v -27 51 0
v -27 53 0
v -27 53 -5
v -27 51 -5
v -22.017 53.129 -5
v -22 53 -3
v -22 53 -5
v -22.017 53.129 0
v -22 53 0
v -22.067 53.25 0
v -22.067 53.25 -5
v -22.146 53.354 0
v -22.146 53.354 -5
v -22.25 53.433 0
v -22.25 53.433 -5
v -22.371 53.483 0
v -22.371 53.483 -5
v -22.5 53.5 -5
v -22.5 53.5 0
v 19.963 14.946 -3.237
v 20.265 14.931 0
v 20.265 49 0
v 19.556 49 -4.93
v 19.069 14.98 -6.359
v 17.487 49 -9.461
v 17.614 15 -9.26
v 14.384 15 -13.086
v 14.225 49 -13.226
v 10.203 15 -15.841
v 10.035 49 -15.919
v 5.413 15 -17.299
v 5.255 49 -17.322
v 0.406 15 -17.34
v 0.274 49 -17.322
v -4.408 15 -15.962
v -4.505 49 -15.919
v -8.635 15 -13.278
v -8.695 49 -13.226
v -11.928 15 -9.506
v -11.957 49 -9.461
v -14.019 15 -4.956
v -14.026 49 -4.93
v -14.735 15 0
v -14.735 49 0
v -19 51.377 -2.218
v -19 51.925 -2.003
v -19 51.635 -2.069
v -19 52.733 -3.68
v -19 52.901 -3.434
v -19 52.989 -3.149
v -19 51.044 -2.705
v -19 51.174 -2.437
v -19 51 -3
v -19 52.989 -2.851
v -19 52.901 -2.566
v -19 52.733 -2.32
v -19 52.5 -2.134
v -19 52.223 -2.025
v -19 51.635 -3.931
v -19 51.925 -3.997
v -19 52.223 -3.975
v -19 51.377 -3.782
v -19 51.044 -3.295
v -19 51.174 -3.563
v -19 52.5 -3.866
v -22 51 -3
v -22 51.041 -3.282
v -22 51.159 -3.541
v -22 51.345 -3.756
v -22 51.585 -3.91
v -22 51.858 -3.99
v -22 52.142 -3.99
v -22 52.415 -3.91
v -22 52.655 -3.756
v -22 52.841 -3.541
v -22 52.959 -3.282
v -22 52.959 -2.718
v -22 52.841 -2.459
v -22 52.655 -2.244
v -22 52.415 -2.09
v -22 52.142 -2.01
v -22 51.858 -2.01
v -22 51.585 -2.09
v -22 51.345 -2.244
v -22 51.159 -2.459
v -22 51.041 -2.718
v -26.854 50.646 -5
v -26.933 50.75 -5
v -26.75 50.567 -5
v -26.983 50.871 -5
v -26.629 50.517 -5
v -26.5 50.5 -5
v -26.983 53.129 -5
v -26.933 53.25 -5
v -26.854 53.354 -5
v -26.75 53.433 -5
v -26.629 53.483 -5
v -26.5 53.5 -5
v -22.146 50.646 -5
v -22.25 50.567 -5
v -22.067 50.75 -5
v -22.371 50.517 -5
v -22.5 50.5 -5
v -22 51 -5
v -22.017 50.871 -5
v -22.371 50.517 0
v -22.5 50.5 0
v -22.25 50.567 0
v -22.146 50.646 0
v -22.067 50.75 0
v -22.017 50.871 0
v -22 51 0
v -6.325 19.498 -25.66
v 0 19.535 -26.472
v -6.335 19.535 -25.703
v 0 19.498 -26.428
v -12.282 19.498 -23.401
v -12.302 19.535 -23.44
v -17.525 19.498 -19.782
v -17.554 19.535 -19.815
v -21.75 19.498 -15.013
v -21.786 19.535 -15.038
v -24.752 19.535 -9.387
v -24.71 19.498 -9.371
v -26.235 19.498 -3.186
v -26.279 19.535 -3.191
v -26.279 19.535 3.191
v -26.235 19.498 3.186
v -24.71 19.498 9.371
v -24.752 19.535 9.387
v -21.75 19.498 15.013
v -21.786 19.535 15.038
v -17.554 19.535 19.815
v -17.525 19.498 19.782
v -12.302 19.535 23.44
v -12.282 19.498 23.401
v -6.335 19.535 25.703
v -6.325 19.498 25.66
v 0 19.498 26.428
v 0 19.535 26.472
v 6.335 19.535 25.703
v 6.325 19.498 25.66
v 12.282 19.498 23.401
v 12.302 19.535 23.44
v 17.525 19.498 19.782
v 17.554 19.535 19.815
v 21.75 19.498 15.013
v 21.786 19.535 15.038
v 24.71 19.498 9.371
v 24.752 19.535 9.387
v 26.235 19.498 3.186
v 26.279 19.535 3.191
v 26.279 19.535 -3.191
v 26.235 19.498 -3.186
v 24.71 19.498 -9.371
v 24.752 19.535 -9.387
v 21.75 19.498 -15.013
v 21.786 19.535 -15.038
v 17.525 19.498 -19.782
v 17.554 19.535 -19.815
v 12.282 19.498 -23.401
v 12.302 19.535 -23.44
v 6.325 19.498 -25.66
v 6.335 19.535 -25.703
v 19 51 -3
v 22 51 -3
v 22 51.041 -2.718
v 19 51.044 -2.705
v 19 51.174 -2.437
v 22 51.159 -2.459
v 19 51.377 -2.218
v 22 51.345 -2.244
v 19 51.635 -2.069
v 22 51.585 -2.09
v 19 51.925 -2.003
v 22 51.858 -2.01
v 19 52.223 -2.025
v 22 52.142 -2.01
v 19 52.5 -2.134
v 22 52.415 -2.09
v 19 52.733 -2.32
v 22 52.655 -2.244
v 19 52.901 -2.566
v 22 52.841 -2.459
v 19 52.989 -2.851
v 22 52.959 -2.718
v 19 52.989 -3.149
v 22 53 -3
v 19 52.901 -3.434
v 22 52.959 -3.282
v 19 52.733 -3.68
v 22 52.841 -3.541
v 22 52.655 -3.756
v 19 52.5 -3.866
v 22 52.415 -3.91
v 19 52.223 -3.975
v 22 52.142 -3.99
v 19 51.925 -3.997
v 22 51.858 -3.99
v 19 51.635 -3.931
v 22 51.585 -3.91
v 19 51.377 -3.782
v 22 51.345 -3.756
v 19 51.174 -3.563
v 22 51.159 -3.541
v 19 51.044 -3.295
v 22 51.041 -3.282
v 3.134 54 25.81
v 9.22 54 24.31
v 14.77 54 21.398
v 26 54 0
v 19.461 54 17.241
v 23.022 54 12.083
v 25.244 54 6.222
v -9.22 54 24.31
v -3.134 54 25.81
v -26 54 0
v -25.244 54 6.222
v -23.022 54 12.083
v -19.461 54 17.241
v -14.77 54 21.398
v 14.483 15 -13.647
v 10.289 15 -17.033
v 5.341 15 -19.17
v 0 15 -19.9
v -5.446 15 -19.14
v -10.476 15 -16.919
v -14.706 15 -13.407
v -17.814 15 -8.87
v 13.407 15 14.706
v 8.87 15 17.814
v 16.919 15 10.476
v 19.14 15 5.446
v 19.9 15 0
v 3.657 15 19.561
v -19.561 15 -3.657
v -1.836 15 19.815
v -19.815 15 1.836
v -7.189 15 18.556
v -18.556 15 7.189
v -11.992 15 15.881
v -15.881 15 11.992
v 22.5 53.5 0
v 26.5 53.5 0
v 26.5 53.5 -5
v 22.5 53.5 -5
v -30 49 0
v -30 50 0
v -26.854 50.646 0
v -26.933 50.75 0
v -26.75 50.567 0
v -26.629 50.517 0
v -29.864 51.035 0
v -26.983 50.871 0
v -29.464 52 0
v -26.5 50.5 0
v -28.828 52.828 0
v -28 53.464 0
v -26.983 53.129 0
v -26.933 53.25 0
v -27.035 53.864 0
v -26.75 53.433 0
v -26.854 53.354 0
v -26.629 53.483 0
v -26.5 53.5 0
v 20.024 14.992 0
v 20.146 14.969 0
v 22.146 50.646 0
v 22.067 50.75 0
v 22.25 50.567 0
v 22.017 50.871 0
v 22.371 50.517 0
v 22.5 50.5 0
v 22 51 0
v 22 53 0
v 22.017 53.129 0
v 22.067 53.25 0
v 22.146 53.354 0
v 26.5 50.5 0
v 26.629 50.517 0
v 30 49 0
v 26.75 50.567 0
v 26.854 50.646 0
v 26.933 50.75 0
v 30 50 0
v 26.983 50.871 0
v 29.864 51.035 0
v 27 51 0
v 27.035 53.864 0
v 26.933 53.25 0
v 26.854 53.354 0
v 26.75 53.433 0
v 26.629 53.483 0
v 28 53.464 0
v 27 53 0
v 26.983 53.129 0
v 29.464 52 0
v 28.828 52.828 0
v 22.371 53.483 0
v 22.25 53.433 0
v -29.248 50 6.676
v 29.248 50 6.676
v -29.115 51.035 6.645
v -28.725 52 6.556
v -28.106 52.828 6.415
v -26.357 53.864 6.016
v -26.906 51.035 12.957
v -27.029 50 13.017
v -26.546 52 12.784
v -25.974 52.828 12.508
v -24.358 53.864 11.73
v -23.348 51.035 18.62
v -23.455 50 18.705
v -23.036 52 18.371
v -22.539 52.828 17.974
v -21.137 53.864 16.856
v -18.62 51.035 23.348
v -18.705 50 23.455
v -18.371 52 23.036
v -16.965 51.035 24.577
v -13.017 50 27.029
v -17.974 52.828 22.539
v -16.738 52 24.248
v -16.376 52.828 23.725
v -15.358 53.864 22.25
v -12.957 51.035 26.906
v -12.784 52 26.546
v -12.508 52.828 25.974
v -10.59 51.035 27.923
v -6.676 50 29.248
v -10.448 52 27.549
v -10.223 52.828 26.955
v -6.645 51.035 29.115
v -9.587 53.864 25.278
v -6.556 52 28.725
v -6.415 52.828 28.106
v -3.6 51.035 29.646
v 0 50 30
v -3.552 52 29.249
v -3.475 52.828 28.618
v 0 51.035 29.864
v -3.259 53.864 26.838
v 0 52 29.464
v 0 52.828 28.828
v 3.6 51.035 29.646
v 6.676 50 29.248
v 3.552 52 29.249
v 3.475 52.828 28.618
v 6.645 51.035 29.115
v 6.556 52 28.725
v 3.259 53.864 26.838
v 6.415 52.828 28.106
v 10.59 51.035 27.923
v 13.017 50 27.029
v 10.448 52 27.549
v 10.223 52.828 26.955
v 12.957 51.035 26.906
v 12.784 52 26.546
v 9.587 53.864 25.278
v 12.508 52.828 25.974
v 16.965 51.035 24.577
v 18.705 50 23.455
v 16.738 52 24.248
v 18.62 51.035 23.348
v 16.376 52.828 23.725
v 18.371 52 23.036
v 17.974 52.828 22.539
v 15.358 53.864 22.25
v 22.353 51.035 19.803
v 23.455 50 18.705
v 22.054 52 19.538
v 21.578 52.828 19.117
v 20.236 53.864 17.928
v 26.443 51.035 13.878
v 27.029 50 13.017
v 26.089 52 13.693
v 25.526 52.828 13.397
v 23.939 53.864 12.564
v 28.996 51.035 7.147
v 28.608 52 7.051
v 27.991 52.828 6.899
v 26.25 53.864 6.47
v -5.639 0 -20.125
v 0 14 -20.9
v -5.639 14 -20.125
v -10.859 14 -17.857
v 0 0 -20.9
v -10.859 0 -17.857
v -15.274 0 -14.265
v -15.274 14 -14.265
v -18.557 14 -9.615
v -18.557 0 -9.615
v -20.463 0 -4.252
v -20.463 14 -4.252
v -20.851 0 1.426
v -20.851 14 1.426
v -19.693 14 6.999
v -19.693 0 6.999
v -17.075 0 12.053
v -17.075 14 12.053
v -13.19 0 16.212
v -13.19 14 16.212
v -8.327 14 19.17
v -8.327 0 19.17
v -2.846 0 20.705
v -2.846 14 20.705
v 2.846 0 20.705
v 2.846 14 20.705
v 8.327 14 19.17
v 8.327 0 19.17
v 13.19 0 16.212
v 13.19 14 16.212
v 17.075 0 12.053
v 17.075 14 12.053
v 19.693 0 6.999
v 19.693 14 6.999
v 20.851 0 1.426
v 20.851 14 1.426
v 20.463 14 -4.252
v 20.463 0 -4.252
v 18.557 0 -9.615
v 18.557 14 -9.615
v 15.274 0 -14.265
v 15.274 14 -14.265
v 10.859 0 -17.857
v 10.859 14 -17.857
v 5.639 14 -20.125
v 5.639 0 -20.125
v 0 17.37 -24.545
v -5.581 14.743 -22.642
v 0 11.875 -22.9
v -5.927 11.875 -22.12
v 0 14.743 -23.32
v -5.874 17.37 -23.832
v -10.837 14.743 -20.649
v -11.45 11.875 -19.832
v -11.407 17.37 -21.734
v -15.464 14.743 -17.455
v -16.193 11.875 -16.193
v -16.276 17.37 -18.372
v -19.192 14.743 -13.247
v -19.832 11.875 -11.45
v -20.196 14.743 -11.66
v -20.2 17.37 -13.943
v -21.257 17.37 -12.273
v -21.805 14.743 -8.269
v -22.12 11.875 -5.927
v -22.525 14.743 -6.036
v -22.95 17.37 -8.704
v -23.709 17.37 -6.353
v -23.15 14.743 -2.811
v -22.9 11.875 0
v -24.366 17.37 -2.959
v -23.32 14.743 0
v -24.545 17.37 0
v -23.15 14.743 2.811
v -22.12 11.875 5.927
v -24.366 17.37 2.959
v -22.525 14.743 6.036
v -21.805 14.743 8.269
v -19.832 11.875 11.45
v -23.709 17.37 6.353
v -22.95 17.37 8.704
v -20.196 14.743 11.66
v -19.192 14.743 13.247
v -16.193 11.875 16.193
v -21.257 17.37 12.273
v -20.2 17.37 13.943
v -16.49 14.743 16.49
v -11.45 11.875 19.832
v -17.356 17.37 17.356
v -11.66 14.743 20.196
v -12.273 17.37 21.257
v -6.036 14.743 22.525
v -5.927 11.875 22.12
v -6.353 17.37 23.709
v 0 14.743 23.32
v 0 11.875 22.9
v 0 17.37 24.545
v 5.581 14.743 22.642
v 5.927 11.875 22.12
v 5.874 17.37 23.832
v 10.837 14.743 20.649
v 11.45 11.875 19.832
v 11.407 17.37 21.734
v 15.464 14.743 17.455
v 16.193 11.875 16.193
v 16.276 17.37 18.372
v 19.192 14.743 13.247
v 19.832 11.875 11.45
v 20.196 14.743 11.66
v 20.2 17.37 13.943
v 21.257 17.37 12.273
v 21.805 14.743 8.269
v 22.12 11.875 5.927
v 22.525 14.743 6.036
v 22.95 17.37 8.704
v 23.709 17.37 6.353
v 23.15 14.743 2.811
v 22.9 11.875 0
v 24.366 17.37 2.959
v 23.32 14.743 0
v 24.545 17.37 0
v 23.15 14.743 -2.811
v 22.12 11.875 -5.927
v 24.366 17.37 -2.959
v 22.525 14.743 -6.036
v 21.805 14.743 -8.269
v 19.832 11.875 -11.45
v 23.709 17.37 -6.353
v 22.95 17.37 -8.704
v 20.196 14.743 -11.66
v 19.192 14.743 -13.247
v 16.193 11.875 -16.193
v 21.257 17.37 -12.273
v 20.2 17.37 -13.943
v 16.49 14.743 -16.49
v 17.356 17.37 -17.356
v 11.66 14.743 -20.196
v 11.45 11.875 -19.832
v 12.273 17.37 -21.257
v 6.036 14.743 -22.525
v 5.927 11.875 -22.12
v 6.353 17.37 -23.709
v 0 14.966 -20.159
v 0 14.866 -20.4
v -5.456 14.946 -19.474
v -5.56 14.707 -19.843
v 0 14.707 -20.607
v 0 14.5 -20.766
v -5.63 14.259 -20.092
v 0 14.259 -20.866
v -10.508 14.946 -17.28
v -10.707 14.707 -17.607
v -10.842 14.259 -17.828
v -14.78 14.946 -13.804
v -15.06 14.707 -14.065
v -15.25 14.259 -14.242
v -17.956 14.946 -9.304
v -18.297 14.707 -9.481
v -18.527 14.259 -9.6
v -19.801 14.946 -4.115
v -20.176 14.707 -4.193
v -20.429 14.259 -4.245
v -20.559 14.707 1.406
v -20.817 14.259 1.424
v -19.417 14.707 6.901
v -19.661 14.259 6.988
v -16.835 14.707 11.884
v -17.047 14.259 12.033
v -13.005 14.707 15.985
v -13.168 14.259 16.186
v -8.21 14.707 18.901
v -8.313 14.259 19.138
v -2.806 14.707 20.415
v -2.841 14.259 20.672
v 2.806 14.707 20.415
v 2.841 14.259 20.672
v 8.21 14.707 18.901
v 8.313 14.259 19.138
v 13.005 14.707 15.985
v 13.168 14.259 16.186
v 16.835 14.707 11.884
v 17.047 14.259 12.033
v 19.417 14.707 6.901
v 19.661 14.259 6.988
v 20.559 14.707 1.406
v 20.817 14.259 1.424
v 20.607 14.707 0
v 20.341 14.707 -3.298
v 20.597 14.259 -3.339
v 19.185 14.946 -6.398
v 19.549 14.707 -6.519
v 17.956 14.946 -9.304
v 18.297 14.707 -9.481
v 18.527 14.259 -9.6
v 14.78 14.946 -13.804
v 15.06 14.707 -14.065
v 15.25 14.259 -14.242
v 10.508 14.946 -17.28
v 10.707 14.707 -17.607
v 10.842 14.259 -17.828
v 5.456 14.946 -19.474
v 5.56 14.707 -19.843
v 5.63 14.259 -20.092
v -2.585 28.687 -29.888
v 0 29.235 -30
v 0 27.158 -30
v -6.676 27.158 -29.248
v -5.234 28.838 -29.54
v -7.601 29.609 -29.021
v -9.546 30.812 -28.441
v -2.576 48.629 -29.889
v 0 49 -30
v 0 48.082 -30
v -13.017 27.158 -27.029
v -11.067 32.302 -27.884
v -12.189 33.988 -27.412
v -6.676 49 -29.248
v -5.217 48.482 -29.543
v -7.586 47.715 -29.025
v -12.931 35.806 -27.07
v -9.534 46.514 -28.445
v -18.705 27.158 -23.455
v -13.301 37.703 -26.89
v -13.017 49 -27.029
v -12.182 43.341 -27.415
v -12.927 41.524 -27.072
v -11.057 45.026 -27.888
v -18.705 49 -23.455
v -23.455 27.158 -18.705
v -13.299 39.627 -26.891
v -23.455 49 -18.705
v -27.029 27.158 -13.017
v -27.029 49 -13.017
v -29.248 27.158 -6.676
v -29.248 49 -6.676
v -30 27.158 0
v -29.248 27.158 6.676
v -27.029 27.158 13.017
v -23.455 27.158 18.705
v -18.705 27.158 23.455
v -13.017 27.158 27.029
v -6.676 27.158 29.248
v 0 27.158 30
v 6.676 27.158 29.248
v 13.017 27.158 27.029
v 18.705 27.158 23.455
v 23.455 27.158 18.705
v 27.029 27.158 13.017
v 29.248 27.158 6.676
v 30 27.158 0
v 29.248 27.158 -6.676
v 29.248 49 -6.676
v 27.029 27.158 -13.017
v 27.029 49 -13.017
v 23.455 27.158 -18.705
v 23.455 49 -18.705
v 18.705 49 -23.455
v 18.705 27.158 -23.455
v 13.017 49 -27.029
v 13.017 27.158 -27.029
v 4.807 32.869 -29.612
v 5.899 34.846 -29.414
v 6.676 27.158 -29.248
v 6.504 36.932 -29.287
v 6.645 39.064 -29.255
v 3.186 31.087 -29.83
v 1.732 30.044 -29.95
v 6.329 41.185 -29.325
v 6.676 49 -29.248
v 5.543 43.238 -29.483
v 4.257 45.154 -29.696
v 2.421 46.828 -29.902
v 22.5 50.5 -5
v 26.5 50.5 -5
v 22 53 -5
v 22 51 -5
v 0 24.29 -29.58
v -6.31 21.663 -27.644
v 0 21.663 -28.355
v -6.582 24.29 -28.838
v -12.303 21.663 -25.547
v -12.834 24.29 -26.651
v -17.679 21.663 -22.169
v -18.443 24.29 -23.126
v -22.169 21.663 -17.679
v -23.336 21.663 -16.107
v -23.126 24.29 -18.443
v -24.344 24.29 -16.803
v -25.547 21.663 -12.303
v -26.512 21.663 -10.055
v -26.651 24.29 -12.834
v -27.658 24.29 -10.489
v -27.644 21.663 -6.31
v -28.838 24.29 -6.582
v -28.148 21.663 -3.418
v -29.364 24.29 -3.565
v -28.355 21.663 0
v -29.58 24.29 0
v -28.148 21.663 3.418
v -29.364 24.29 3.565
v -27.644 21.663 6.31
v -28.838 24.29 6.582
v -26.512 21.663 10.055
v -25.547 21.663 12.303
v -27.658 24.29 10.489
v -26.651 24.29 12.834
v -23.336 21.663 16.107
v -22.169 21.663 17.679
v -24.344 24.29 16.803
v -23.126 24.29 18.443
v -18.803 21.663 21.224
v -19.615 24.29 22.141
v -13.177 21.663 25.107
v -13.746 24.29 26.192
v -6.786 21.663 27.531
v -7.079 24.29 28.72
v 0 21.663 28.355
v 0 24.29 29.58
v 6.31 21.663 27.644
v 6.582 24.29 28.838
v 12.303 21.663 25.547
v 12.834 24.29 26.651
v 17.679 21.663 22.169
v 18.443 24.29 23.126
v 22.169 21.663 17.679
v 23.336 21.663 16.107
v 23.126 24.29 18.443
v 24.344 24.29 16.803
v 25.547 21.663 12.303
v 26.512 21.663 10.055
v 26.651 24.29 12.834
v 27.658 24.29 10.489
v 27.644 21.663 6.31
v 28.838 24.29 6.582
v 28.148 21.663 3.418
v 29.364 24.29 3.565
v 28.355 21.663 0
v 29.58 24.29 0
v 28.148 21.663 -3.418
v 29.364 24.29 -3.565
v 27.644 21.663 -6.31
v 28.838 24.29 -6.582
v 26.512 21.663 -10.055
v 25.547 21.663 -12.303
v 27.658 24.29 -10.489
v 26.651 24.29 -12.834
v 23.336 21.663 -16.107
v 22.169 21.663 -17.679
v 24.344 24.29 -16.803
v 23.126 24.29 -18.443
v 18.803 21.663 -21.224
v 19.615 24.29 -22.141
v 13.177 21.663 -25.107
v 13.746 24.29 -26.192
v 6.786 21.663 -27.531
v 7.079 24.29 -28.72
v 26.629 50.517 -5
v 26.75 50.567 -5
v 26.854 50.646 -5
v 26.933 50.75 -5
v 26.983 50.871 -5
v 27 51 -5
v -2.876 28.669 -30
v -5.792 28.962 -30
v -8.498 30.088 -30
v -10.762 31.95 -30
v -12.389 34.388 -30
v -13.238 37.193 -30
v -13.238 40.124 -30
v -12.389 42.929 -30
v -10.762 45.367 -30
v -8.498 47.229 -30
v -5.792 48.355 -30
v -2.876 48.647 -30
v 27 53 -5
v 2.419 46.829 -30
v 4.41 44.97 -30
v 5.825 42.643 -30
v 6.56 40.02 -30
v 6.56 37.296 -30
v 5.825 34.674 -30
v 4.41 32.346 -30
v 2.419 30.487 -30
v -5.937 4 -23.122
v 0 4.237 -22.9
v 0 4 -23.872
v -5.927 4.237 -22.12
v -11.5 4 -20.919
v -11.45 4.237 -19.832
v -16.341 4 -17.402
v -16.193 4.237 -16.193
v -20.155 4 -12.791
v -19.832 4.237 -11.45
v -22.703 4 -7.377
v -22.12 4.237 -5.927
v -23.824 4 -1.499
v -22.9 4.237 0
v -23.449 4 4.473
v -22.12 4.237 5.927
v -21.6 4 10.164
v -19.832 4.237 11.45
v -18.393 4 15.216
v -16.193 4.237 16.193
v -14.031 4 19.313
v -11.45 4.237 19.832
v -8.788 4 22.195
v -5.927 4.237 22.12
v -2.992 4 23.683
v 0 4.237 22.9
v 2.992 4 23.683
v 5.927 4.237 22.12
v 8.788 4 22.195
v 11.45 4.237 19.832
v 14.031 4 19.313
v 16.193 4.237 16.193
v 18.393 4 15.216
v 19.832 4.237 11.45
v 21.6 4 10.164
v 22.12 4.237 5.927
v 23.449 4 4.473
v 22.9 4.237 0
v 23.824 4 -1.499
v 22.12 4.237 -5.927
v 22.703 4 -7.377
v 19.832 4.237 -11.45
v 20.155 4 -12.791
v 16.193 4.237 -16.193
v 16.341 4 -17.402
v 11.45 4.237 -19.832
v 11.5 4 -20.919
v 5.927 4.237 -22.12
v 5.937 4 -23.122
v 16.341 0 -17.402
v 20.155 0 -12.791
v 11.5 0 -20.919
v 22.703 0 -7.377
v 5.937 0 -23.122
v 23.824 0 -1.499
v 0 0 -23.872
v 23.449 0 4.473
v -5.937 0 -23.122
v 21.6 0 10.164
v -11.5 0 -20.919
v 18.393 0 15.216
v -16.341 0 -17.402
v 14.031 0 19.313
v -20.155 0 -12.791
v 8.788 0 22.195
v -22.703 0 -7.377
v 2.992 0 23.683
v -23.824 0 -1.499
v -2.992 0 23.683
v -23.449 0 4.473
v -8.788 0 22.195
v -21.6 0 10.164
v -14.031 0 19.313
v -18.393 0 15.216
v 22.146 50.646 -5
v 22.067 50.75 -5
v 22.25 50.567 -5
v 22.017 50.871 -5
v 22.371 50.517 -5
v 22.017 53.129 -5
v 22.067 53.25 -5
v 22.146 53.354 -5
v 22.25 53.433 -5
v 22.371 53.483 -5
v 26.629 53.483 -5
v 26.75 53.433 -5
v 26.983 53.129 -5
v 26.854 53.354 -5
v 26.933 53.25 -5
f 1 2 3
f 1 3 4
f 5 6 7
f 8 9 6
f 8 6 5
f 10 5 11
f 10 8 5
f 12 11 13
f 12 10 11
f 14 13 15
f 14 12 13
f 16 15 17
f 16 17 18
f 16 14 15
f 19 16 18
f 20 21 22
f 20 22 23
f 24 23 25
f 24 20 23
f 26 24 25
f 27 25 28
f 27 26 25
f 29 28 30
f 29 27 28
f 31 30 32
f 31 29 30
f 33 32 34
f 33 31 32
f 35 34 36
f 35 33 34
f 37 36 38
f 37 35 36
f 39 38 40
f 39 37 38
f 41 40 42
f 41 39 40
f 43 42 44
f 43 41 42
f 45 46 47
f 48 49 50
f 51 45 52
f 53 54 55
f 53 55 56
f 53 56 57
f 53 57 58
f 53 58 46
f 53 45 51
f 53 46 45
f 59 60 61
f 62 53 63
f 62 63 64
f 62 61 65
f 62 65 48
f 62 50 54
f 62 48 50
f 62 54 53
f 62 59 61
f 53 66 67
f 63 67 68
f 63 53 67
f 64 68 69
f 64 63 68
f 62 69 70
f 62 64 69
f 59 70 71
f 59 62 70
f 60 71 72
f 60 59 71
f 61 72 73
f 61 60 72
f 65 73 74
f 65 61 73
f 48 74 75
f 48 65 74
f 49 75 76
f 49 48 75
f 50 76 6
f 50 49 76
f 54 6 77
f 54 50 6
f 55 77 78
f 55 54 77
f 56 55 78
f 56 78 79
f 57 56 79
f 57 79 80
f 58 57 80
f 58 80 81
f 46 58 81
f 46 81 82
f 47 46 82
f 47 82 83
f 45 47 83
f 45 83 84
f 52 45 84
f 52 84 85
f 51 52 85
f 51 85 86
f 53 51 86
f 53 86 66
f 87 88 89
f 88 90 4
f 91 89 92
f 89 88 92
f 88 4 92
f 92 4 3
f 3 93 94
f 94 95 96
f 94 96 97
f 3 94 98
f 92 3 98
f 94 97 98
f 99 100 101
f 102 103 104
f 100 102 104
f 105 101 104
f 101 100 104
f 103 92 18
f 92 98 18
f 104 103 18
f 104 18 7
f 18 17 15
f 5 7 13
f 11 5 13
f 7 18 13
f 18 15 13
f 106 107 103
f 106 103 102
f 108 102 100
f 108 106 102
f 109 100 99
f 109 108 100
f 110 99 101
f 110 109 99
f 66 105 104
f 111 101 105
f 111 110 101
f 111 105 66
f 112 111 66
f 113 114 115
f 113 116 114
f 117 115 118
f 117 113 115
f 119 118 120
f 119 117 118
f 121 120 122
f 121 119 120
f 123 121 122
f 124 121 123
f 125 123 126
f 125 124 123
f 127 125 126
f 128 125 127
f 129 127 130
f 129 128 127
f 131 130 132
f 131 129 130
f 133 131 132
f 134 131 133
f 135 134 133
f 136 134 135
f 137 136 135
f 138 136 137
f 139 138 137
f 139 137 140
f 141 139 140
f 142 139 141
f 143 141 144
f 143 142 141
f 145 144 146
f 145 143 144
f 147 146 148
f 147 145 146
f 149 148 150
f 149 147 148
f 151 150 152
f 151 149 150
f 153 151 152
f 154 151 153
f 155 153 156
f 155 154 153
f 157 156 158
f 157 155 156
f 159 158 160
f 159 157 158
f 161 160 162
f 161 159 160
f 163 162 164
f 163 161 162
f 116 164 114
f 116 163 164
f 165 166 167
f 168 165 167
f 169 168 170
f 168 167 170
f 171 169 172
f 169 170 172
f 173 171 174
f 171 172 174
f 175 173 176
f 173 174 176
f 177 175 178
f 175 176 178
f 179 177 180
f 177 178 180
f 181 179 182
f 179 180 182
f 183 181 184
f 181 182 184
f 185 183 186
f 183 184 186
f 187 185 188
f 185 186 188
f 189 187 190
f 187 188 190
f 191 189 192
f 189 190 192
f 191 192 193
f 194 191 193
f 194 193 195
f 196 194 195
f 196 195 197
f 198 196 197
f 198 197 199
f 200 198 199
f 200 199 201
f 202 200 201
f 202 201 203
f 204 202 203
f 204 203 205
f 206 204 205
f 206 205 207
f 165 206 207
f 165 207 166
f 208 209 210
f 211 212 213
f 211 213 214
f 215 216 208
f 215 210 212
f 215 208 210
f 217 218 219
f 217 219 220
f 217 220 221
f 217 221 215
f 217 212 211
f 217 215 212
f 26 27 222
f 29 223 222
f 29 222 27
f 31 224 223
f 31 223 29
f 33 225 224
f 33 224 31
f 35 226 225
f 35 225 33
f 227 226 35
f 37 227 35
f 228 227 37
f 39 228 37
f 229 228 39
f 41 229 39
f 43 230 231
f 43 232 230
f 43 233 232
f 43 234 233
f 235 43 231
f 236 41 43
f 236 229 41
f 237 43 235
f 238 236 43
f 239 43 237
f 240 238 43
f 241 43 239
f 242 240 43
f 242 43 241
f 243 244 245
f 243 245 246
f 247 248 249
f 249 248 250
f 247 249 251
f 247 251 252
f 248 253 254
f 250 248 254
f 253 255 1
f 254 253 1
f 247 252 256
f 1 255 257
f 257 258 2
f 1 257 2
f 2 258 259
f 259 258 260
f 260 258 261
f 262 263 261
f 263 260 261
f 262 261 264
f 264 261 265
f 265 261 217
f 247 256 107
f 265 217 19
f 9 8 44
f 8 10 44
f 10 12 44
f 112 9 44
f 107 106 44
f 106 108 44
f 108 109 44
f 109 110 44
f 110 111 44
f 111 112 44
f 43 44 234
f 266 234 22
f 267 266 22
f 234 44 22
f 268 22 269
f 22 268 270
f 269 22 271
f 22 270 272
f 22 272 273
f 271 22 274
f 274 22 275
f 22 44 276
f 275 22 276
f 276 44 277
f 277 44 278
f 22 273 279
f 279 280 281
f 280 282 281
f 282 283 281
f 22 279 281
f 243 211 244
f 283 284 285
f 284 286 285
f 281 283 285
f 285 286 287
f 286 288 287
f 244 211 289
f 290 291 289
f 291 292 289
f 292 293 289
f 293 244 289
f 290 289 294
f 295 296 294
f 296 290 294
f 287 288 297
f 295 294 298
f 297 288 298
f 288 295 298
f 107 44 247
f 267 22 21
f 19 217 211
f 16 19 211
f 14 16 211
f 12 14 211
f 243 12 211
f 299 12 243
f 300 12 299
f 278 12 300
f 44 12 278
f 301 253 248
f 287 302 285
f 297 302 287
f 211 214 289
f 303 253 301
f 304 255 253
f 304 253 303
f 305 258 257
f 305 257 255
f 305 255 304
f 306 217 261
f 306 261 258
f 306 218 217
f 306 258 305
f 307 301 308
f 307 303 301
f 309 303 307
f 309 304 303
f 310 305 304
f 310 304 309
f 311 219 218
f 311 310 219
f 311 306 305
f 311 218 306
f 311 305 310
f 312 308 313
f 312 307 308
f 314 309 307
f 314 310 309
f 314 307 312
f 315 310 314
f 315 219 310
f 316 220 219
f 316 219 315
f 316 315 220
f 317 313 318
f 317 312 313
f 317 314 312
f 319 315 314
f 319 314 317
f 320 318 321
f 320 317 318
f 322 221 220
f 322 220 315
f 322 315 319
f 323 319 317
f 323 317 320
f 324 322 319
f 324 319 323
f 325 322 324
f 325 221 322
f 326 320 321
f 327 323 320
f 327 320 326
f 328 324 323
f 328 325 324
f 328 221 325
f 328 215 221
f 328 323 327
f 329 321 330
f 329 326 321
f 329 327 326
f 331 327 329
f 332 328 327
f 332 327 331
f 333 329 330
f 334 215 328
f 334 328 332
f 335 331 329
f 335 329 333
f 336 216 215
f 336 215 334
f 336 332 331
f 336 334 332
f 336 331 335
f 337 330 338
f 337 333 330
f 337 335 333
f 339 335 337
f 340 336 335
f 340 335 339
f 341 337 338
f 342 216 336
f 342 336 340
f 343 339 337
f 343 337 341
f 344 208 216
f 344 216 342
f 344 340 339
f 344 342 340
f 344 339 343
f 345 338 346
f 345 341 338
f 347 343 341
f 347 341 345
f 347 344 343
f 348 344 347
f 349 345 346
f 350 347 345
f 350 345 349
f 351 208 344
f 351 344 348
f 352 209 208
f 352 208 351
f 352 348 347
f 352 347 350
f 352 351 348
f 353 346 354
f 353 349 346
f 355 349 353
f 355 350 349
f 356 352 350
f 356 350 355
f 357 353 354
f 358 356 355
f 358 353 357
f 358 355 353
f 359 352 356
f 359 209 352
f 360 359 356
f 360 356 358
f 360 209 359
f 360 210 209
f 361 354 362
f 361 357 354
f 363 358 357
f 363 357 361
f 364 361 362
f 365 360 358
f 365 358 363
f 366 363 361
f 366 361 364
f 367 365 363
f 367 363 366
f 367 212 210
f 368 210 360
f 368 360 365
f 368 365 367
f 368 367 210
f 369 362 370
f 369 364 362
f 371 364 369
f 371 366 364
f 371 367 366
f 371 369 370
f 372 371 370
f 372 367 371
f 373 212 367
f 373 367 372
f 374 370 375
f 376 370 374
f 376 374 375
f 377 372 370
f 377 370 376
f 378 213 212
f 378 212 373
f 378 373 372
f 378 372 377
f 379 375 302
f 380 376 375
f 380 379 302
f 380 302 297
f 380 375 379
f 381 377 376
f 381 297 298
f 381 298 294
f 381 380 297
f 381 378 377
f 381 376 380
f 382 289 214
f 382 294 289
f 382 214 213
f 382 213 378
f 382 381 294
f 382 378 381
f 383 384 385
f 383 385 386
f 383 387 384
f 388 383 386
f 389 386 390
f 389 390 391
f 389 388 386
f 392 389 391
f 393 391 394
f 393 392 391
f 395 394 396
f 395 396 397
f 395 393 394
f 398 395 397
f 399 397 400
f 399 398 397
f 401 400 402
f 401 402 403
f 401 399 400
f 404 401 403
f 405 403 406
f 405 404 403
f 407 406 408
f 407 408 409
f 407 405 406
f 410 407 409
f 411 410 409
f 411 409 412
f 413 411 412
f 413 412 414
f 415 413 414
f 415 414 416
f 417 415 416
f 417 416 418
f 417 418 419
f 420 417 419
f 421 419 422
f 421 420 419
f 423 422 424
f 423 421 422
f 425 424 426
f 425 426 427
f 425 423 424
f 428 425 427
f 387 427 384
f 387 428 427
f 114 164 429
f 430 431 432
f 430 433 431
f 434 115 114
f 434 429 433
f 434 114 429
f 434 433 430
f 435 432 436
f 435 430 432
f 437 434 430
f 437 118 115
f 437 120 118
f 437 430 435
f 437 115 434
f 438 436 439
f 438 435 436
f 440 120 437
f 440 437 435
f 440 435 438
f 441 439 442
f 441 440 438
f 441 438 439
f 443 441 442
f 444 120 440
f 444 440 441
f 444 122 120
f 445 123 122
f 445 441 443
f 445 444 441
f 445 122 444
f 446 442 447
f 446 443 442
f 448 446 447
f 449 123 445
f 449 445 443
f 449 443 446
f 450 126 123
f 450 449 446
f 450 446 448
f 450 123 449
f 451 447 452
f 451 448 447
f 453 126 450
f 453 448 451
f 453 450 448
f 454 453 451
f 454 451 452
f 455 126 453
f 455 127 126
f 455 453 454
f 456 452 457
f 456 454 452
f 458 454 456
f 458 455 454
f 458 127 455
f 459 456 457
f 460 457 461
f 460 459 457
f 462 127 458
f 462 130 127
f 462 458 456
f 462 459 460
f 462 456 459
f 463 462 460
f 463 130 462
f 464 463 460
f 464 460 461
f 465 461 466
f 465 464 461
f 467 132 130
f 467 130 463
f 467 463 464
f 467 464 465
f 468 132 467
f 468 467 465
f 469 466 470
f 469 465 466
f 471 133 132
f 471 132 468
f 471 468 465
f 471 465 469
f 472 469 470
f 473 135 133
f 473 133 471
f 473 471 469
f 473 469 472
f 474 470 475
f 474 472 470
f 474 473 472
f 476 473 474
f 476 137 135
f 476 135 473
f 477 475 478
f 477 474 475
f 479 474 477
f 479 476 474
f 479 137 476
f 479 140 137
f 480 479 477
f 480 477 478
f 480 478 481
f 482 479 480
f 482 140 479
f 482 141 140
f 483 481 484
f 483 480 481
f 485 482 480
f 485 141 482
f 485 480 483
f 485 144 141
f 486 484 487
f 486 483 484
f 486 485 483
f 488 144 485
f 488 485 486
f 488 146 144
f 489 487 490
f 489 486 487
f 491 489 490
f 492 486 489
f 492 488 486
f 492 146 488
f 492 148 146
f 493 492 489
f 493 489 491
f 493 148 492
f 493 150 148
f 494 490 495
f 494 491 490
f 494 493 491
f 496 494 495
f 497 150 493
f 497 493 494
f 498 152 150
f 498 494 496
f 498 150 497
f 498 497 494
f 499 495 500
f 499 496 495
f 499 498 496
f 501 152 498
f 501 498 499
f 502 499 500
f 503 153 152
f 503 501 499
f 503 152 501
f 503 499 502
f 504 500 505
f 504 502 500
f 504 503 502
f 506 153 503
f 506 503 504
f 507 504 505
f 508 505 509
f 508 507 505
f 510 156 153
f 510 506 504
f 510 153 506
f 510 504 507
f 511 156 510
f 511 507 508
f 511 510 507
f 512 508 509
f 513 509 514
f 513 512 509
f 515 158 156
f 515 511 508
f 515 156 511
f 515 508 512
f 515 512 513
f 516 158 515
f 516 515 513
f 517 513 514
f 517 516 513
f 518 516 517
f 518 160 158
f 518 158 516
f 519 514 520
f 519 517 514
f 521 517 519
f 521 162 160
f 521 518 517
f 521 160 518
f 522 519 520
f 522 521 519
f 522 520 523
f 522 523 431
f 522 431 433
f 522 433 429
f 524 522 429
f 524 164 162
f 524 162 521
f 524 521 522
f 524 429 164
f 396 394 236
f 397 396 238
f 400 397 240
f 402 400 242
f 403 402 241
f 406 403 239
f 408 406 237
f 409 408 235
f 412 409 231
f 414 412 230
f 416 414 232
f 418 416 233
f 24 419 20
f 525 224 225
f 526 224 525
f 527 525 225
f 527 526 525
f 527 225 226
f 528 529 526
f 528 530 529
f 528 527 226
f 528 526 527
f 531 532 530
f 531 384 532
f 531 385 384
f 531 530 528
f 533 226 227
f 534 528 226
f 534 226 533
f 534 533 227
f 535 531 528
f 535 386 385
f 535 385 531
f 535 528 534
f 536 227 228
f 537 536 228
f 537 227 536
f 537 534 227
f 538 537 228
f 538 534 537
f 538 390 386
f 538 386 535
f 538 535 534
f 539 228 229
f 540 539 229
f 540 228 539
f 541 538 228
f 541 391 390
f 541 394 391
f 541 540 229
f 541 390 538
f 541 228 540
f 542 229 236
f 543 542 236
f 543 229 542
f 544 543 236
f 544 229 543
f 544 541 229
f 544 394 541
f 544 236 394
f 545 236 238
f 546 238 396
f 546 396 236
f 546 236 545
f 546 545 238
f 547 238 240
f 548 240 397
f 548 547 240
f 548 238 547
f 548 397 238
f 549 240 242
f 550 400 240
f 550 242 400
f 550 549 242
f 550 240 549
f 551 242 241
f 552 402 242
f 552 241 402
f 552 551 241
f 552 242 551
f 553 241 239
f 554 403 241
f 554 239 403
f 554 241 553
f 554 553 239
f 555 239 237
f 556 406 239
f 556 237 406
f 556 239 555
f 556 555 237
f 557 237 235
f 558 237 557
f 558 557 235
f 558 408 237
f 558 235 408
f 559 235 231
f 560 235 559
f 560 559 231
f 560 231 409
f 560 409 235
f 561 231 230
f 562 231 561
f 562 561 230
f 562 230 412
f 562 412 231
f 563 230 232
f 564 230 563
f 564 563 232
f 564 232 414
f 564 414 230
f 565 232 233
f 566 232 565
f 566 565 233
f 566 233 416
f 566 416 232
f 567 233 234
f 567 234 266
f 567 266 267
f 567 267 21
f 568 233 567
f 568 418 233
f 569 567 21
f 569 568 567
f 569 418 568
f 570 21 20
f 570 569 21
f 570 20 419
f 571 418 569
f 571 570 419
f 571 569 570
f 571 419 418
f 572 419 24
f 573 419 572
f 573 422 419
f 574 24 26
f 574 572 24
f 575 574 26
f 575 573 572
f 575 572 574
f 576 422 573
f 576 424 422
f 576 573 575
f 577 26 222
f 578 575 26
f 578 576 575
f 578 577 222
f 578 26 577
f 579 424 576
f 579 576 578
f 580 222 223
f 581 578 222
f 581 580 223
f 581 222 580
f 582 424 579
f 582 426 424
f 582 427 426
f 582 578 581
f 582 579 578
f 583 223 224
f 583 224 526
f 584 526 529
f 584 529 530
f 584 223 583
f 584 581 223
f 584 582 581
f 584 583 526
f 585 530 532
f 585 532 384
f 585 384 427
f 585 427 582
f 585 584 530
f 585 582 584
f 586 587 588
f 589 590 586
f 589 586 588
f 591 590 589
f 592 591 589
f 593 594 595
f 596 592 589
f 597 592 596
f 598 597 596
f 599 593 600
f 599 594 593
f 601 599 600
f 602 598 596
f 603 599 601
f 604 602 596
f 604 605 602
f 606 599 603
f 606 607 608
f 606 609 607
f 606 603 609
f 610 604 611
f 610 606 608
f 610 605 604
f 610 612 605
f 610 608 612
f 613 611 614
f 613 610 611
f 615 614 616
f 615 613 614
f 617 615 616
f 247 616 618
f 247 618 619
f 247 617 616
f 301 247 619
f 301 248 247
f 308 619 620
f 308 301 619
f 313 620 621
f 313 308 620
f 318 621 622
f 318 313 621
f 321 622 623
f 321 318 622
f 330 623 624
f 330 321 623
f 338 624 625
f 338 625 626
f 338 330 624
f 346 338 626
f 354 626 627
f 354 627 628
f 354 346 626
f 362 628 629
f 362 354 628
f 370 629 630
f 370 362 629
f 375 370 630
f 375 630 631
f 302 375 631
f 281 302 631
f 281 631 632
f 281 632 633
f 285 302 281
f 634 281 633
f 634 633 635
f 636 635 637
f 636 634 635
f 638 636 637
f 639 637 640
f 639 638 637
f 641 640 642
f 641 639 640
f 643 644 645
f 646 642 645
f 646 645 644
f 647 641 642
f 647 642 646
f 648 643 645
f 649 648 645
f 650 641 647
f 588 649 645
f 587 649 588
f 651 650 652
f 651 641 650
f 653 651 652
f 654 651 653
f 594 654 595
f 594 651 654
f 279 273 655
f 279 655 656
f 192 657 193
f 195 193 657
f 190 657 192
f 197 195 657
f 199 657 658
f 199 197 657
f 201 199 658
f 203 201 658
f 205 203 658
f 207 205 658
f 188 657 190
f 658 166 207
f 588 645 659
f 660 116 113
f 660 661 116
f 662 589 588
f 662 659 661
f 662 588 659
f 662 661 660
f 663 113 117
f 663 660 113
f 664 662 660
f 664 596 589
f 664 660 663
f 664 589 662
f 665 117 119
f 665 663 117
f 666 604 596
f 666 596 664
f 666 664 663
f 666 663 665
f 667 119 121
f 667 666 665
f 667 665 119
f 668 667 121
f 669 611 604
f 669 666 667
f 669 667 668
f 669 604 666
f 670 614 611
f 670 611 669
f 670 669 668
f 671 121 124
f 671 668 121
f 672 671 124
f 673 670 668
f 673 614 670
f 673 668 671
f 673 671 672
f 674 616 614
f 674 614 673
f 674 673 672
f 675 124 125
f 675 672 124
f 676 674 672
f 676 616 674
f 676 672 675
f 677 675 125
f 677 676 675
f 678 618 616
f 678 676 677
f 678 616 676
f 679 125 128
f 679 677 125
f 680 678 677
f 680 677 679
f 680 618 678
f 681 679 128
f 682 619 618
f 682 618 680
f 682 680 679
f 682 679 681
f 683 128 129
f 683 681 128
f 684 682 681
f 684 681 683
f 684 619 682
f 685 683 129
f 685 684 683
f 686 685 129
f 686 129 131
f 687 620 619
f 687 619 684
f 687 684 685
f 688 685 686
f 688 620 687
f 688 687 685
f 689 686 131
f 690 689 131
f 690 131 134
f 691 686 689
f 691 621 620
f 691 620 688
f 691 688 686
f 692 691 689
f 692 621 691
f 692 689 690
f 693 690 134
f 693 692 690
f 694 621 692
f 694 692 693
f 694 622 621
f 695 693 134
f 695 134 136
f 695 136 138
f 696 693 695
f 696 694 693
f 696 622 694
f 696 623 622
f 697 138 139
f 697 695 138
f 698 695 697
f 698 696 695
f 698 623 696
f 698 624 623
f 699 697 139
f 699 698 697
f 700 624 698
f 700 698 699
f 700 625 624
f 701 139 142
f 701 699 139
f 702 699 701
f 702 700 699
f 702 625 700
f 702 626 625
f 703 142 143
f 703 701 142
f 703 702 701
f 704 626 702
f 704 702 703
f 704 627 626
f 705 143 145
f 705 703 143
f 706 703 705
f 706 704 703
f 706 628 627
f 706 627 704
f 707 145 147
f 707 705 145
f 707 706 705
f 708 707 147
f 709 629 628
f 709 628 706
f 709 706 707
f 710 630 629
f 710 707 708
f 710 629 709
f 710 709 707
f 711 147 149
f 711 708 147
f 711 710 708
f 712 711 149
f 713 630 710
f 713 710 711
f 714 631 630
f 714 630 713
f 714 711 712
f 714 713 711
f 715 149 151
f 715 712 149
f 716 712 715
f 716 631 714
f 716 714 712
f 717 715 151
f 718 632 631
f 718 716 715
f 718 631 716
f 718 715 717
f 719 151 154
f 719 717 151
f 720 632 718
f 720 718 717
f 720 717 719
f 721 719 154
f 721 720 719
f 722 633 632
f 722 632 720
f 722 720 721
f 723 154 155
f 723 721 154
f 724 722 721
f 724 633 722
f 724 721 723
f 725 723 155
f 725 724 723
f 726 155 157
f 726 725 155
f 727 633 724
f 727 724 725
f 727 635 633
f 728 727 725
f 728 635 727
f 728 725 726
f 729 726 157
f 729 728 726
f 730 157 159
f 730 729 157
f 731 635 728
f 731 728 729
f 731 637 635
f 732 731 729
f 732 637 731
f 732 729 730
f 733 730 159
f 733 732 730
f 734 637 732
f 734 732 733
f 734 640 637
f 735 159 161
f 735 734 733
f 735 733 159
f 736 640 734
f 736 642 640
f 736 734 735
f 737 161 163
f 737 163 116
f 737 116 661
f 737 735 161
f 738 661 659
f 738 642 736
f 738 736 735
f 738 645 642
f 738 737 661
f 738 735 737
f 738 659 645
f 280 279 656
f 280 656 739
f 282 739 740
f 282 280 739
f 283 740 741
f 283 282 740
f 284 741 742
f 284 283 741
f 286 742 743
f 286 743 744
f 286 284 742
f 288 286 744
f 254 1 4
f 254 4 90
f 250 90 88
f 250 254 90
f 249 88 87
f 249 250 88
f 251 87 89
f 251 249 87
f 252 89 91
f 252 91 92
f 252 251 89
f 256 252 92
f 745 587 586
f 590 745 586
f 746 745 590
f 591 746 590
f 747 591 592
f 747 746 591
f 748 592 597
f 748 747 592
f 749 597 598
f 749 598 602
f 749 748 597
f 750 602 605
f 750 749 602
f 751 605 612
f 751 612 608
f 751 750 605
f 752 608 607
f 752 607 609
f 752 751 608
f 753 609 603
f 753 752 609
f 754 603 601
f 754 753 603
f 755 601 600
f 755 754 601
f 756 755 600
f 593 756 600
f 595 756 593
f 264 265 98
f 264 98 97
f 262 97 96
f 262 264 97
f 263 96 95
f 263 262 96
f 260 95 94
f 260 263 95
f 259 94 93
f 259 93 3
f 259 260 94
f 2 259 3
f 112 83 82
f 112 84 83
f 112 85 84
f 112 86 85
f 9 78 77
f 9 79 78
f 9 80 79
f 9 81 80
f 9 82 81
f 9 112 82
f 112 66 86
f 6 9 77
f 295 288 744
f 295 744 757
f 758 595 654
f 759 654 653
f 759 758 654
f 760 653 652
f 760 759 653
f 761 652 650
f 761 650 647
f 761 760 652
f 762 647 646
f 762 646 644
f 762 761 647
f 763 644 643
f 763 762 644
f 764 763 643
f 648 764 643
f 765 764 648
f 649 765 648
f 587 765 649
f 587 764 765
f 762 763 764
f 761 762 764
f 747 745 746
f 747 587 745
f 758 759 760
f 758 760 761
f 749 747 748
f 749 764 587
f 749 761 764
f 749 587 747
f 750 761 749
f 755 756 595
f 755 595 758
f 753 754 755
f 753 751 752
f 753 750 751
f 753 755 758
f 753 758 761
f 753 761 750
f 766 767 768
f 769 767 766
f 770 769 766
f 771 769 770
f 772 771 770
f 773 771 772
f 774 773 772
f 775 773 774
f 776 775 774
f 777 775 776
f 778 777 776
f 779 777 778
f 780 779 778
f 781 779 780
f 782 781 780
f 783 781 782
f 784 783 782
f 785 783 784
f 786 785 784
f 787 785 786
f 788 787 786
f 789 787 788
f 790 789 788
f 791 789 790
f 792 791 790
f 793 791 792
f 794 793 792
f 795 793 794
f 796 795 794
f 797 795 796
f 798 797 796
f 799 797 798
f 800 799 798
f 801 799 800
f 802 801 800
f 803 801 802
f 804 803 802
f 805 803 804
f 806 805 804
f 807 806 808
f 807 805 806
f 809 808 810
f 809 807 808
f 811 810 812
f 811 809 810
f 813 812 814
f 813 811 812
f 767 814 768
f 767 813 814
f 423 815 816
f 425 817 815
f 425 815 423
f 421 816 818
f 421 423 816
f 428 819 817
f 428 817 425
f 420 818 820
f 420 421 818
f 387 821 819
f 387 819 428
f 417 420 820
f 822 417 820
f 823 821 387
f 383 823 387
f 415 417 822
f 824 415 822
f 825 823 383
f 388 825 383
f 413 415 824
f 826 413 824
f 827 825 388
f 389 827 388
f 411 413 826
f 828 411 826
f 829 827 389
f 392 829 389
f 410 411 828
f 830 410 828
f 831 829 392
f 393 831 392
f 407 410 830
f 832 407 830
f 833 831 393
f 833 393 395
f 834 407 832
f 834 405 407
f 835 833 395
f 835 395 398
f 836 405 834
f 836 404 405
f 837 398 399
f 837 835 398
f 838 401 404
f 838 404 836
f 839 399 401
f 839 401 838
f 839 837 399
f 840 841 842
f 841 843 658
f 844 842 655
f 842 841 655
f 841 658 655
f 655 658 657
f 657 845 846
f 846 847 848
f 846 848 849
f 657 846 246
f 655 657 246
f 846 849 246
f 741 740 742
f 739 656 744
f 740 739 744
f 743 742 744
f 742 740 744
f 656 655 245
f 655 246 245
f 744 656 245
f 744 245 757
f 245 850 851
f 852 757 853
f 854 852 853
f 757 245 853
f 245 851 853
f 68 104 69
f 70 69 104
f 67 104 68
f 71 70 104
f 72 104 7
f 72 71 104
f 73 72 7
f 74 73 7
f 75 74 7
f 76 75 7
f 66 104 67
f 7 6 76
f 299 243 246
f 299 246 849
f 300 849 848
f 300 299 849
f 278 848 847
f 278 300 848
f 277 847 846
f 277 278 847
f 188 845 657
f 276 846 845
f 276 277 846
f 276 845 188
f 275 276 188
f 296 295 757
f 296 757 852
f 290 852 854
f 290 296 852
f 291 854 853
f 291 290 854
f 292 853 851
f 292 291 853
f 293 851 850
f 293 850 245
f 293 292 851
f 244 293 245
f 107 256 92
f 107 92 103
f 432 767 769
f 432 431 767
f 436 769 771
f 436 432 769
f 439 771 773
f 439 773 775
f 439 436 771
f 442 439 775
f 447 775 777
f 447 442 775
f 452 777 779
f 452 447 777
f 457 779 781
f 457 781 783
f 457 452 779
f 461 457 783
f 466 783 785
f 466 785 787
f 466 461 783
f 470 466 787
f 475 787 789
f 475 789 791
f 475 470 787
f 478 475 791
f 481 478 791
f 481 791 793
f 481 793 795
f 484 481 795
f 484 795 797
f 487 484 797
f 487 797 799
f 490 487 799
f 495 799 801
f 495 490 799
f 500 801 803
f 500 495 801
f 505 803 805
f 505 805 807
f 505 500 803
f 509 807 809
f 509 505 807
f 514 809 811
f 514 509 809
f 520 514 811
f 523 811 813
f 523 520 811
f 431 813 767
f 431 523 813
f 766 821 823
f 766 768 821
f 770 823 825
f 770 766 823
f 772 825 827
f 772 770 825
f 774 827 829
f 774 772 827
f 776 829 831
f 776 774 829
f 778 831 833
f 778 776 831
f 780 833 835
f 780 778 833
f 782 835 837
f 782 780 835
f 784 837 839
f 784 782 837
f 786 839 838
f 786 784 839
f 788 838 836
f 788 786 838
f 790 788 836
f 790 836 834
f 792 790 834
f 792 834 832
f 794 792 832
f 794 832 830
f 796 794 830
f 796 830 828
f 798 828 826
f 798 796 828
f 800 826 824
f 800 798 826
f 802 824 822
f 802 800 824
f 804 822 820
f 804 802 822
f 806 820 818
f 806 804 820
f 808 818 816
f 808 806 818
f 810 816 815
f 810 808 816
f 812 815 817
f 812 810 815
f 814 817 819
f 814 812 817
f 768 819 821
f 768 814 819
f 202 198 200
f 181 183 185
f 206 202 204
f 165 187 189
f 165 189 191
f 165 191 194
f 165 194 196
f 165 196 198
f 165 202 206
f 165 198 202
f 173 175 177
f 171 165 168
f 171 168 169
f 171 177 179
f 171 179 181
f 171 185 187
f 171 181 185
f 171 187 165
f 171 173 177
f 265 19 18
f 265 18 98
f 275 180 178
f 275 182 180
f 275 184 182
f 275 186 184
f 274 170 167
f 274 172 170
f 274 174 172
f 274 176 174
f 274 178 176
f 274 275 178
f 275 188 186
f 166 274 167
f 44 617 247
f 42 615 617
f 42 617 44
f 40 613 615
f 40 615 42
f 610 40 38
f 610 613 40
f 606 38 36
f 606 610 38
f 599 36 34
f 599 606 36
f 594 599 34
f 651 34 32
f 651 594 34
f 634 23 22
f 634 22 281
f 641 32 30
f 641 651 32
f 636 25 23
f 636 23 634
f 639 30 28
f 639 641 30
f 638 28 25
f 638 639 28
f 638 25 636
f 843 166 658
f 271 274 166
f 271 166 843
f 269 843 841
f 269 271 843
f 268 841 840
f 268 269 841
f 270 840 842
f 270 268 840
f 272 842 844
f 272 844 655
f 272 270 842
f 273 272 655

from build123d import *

# Parameters (mm, degrees)
SKETCH10_R              = 10
BOSS_EXTRUDE1_DEPTH     = 5
CUT_EXTRUDE3_DEPTH      = 45
CUT_EXTRUDE3_DEPTH_BACK = 20
CUT_EXTRUDE5_DEPTH      = 5
BOSS_EXTRUDE2_DEPTH     = 5
SKETCH14_R              = 1
BOSS_EXTRUDE3_DEPTH     = 3
BOSS_EXTRUDE4_START     = 3
SKETCH15_R              = 1
BOSS_EXTRUDE4_DEPTH     = 3


with BuildPart() as part:
    # Sketch1 → Revolve1 (revolve)
    with BuildSketch(Plane.XY):
        with BuildLine():
            Line((20.9, 0), (23.871591838, 0))
            Line((23.871591838, 0), (23.871591838, 4))
            Line((23.871591838, 4), (22.9, 4.236662843))
            Line((22.9, 4.236662843), (22.9, 11.874576818))
            ThreePointArc((22.9, 11.874576818), (23.83692213, 16.100759435), (26.472123903, 19.535021249))
            Line((26.472123903, 19.535021249), (26.427876097, 19.497892931))
            ThreePointArc((26.427876097, 19.497892931), (29.06307787, 22.932154745), (30, 27.158337362))
            Line((30, 27.158337362), (30, 50))
            ThreePointArc((30, 50), (28.828427125, 52.828427125), (26, 54))
            Line((26, 54), (0, 54))
            Line((0, 54), (0, 15))
            Line((0, 15), (19.9, 15))
            ThreePointArc((19.9, 15), (20.607106781, 14.707106781), (20.9, 14))
            Line((20.9, 14), (20.9, 0))
        make_face()
    revolve(axis=Axis((0, 0, 0), (0, 1, 0)))

    # Sketch10 → Boss-Extrude1 (add)
    with BuildSketch(Plane(origin=(0, 0, -30), x_dir=(-1, 0, 0), z_dir=(0, 0, -1))):
        with Locations((3.346345887, 38.658337362)):
            Circle(SKETCH10_R)
    extrude(amount=-BOSS_EXTRUDE1_DEPTH)

    # Sketch11 → Cut-Extrude3 (cut, two sides: drawn at the far end of the back side and taken through both)
    with BuildSketch(Plane(origin=(0, 17, 0), x_dir=(1, 0, 0), z_dir=(0, 1, 0)).offset(-CUT_EXTRUDE3_DEPTH_BACK)):
        with BuildLine():
            Line((-14.735085045, 0), (20.264914955, 0))
            ThreePointArc((20.264914955, 0), (2.764914955, 17.5), (-14.735085045, 0))
        make_face()
    extrude(amount=CUT_EXTRUDE3_DEPTH + CUT_EXTRUDE3_DEPTH_BACK, mode=Mode.SUBTRACT)

    # Sketch9 → Cut-Extrude5 (cut)
    with BuildSketch(Plane(origin=(0, 54, 0), x_dir=(1, 0, 0), z_dir=(0, 1, 0))):
        with BuildLine():
            Line((-30, 0), (30, 0))
            ThreePointArc((30, 0), (0, 30), (-30, 0))
        make_face()
    extrude(amount=-CUT_EXTRUDE5_DEPTH, mode=Mode.SUBTRACT)

    # Sketch13 → Boss-Extrude2 (add)
    with BuildSketch(Plane(origin=(0, 0, 0), x_dir=(-1, 0, 0), z_dir=(0, 0, -1))):
        with BuildLine():
            Line((22.5, 53.5), (26.5, 53.5))
            ThreePointArc((26.5, 53.5), (26.853553391, 53.353553391), (27, 53))
            Line((27, 53), (27, 51))
            ThreePointArc((27, 51), (26.853553391, 50.646446609), (26.5, 50.5))
            Line((26.5, 50.5), (22.5, 50.5))
            ThreePointArc((22.5, 50.5), (22.146446609, 50.646446609), (22, 51))
            Line((22, 51), (22, 53))
            ThreePointArc((22, 53), (22.146446609, 53.353553391), (22.5, 53.5))
        make_face()
        with BuildLine():
            Line((-26.5, 53.5), (-22.5, 53.5))
            ThreePointArc((-22.5, 53.5), (-22.146446609, 53.353553391), (-22, 53))
            Line((-22, 53), (-22, 51))
            ThreePointArc((-22, 51), (-22.146446609, 50.646446609), (-22.5, 50.5))
            Line((-22.5, 50.5), (-26.5, 50.5))
            ThreePointArc((-26.5, 50.5), (-26.853553391, 50.646446609), (-27, 51))
            Line((-27, 51), (-27, 53))
            ThreePointArc((-27, 53), (-26.853553391, 53.353553391), (-26.5, 53.5))
        make_face()
    extrude(amount=BOSS_EXTRUDE2_DEPTH)

    # Sketch14 → Boss-Extrude3 (add)
    with BuildSketch(Plane.ZY.offset(-22)):
        with Locations((-3, 52)):
            Circle(SKETCH14_R)
    extrude(amount=BOSS_EXTRUDE3_DEPTH)

    # Sketch15 → Boss-Extrude4 (add)
    with BuildSketch(Plane(origin=(-22, 0, 0), x_dir=(0, 0, -1), z_dir=(1, 0, 0)).offset(BOSS_EXTRUDE4_START)):
        with Locations((3, 52)):
            Circle(SKETCH15_R)
    extrude(amount=-BOSS_EXTRUDE4_DEPTH)


solid = part.part
